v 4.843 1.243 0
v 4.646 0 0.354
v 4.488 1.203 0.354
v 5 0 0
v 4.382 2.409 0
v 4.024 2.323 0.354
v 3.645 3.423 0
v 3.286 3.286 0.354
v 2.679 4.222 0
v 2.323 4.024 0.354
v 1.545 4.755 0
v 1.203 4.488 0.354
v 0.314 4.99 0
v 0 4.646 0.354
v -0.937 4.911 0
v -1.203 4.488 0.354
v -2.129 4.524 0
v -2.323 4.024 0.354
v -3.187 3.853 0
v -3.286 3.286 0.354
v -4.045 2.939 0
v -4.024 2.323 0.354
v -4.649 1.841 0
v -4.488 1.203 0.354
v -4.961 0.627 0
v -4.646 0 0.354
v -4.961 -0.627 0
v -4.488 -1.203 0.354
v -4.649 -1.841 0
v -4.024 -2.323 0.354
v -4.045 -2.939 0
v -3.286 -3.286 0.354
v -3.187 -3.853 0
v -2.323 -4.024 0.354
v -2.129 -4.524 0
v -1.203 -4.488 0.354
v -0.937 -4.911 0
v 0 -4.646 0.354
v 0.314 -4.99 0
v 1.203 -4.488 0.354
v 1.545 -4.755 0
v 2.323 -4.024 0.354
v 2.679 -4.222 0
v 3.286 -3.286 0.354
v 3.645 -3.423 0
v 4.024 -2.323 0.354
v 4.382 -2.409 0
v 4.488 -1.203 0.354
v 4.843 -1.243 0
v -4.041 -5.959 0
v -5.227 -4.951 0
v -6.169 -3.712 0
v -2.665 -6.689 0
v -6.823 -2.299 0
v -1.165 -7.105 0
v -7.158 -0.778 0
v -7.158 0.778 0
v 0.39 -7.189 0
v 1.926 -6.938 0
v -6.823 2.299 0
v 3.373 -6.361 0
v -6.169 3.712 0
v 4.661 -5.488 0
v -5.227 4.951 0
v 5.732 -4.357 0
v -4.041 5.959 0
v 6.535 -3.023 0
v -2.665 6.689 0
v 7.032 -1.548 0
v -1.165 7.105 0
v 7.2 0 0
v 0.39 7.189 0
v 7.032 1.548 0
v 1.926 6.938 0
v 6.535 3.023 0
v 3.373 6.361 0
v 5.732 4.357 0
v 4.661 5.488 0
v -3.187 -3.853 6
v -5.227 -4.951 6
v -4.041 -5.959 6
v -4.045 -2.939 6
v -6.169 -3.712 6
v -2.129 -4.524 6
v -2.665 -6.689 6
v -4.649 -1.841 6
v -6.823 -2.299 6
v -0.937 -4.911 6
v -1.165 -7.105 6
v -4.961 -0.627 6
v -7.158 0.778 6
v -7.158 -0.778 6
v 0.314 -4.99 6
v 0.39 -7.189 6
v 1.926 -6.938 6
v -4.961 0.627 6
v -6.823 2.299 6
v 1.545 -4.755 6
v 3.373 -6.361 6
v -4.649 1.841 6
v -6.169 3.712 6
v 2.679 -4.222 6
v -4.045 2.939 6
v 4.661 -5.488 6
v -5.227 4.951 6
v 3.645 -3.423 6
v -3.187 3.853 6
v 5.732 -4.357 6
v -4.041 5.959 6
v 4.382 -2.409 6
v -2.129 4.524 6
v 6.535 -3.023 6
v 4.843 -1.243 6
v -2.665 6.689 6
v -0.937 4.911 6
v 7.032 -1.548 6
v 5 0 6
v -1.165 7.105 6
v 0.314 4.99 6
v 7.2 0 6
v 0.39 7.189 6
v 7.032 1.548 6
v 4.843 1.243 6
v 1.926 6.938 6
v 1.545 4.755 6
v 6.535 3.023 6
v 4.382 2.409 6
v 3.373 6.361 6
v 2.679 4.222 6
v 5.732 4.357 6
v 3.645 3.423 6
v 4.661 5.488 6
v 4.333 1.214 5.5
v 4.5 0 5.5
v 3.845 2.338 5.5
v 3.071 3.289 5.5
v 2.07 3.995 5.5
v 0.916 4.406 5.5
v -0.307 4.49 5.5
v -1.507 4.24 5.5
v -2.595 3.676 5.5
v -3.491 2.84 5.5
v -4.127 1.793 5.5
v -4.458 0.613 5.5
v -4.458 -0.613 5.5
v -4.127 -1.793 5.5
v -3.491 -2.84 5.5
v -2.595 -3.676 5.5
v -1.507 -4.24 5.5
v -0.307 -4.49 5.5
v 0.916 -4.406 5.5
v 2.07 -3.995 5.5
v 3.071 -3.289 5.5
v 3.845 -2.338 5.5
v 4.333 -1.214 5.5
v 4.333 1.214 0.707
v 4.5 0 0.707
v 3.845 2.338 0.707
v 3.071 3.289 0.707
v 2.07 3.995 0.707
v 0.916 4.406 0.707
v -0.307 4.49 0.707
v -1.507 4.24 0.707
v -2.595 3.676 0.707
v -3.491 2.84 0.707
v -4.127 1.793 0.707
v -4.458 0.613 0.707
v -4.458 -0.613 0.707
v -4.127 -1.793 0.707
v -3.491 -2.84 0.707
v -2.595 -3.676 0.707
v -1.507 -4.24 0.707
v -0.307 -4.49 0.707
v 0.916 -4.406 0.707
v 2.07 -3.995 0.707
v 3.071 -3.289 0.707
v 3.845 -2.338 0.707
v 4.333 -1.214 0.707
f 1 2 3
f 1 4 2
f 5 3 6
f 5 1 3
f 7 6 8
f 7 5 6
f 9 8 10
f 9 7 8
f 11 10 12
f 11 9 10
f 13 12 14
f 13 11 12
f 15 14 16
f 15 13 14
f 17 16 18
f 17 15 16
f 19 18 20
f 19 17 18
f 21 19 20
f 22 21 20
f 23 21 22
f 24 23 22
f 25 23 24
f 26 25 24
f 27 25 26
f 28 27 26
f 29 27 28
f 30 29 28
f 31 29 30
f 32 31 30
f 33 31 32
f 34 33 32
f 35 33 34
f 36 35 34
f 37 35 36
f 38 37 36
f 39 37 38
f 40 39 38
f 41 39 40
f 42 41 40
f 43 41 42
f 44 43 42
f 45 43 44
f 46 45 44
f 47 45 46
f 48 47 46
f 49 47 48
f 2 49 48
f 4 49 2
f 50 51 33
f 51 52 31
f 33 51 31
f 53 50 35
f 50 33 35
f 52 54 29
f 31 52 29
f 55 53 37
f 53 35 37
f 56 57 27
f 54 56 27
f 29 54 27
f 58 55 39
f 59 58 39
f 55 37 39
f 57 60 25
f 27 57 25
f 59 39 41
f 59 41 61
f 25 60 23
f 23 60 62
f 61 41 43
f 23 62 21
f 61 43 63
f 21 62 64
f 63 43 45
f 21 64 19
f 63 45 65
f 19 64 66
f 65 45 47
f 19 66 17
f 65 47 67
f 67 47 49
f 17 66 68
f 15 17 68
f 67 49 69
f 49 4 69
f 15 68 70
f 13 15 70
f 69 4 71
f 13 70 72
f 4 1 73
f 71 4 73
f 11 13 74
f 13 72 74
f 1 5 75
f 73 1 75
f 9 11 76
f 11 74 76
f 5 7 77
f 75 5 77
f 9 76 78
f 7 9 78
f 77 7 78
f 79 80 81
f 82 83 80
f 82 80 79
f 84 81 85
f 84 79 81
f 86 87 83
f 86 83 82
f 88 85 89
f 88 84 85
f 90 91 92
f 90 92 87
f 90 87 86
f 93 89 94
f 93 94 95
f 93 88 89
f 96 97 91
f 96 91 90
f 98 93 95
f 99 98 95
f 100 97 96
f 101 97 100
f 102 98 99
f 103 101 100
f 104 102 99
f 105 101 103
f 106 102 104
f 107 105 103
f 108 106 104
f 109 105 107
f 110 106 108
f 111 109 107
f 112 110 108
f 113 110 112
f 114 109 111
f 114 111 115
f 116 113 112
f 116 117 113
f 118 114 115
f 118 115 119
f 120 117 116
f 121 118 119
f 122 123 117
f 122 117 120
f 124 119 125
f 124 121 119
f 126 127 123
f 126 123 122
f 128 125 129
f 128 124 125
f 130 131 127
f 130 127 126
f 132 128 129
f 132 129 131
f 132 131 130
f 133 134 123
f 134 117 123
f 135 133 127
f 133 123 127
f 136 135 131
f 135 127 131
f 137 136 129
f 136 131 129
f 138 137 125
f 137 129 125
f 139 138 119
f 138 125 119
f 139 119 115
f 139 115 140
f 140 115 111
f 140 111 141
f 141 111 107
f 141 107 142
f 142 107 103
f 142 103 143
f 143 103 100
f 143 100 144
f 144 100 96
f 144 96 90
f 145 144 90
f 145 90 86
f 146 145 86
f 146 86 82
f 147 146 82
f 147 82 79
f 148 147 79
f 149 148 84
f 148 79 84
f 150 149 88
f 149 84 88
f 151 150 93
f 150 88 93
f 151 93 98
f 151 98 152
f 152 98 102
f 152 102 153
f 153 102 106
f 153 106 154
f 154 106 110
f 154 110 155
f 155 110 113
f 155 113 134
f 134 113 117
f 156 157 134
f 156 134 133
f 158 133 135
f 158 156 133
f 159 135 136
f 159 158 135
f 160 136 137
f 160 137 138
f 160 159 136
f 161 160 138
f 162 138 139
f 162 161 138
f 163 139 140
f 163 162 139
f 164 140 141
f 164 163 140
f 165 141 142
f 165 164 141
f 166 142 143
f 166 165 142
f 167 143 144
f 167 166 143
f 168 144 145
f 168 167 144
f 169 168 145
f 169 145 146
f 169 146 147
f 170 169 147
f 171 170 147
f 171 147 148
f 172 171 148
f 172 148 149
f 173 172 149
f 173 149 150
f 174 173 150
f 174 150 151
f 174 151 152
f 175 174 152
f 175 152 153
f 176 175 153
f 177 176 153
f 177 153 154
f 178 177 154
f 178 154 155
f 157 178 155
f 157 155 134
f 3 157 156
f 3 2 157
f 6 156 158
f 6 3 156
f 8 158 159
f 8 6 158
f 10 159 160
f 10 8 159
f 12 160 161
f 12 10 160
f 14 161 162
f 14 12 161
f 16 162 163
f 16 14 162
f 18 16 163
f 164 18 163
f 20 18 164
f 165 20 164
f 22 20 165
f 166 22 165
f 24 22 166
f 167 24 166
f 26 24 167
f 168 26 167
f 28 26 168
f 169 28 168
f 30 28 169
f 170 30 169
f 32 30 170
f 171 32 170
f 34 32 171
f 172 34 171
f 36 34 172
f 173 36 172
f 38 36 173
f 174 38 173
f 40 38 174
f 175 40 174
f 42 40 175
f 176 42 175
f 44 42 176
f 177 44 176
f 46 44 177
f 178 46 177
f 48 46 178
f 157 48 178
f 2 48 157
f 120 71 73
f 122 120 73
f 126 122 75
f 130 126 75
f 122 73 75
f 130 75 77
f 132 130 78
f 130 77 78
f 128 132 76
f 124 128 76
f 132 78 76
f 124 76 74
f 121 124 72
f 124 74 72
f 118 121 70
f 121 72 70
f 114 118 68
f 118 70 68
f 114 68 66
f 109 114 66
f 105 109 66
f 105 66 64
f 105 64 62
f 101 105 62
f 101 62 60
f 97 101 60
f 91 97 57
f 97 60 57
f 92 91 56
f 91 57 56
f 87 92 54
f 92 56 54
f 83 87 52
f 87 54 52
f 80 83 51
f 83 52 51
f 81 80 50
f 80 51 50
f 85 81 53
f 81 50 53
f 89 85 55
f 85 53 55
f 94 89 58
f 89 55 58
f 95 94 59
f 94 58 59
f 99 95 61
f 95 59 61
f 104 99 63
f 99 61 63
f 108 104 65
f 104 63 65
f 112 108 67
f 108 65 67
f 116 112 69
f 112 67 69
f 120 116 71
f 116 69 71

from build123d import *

# Parameters (mm, degrees)
F0_R     = 7.2
F0_R_2   = 4.5
F1_DEPTH = 6
F2_SIZE2 = 0.5
F2_SIZE  = 0.5


# Not quite as in the source:
# - a fillet or chamfer that OpenCascade refuses, or shapes differently, is made with other operations: its cross-section is extruded or revolved along the edge and cut away or added


with BuildPart() as f1:
    # F0 (on Top) → F1 (new body)
    with BuildSketch(Plane.XY):
        Circle(F0_R)
        Circle(F0_R_2, mode=Mode.SUBTRACT)
    extrude(amount=F1_DEPTH)

    # F2
    f2_edges = [f1.edges().sort_by_distance(p)[0] for p in [
        (-4.5, 0, 0),
    ]]
    chamfer(f2_edges, length=F2_SIZE, length2=F2_SIZE2)

    # F3: chamfer of 0.5 on 3 edges, made by hand

    # F3_s1 → F3_t2 (revolve, cut)
    with BuildSketch(Plane.XZ):
        Polygon((4.5, 0.7071067812), (4.6464466094, 0.3535533906), (4.5, 0.5), align=None)
    revolve(axis=Axis((0, 0, 0.5), (0, 0, 1)), mode=Mode.SUBTRACT)

    # F3_s3 → F3_t4 (revolve, cut)
    with BuildSketch(Plane.XZ):
        Polygon((4.5, 5.5), (5, 6), (4.5, 6), align=None)
    revolve(axis=Axis((0, 0, 6), (0, 0, 1)), mode=Mode.SUBTRACT)


solid = f1.part
